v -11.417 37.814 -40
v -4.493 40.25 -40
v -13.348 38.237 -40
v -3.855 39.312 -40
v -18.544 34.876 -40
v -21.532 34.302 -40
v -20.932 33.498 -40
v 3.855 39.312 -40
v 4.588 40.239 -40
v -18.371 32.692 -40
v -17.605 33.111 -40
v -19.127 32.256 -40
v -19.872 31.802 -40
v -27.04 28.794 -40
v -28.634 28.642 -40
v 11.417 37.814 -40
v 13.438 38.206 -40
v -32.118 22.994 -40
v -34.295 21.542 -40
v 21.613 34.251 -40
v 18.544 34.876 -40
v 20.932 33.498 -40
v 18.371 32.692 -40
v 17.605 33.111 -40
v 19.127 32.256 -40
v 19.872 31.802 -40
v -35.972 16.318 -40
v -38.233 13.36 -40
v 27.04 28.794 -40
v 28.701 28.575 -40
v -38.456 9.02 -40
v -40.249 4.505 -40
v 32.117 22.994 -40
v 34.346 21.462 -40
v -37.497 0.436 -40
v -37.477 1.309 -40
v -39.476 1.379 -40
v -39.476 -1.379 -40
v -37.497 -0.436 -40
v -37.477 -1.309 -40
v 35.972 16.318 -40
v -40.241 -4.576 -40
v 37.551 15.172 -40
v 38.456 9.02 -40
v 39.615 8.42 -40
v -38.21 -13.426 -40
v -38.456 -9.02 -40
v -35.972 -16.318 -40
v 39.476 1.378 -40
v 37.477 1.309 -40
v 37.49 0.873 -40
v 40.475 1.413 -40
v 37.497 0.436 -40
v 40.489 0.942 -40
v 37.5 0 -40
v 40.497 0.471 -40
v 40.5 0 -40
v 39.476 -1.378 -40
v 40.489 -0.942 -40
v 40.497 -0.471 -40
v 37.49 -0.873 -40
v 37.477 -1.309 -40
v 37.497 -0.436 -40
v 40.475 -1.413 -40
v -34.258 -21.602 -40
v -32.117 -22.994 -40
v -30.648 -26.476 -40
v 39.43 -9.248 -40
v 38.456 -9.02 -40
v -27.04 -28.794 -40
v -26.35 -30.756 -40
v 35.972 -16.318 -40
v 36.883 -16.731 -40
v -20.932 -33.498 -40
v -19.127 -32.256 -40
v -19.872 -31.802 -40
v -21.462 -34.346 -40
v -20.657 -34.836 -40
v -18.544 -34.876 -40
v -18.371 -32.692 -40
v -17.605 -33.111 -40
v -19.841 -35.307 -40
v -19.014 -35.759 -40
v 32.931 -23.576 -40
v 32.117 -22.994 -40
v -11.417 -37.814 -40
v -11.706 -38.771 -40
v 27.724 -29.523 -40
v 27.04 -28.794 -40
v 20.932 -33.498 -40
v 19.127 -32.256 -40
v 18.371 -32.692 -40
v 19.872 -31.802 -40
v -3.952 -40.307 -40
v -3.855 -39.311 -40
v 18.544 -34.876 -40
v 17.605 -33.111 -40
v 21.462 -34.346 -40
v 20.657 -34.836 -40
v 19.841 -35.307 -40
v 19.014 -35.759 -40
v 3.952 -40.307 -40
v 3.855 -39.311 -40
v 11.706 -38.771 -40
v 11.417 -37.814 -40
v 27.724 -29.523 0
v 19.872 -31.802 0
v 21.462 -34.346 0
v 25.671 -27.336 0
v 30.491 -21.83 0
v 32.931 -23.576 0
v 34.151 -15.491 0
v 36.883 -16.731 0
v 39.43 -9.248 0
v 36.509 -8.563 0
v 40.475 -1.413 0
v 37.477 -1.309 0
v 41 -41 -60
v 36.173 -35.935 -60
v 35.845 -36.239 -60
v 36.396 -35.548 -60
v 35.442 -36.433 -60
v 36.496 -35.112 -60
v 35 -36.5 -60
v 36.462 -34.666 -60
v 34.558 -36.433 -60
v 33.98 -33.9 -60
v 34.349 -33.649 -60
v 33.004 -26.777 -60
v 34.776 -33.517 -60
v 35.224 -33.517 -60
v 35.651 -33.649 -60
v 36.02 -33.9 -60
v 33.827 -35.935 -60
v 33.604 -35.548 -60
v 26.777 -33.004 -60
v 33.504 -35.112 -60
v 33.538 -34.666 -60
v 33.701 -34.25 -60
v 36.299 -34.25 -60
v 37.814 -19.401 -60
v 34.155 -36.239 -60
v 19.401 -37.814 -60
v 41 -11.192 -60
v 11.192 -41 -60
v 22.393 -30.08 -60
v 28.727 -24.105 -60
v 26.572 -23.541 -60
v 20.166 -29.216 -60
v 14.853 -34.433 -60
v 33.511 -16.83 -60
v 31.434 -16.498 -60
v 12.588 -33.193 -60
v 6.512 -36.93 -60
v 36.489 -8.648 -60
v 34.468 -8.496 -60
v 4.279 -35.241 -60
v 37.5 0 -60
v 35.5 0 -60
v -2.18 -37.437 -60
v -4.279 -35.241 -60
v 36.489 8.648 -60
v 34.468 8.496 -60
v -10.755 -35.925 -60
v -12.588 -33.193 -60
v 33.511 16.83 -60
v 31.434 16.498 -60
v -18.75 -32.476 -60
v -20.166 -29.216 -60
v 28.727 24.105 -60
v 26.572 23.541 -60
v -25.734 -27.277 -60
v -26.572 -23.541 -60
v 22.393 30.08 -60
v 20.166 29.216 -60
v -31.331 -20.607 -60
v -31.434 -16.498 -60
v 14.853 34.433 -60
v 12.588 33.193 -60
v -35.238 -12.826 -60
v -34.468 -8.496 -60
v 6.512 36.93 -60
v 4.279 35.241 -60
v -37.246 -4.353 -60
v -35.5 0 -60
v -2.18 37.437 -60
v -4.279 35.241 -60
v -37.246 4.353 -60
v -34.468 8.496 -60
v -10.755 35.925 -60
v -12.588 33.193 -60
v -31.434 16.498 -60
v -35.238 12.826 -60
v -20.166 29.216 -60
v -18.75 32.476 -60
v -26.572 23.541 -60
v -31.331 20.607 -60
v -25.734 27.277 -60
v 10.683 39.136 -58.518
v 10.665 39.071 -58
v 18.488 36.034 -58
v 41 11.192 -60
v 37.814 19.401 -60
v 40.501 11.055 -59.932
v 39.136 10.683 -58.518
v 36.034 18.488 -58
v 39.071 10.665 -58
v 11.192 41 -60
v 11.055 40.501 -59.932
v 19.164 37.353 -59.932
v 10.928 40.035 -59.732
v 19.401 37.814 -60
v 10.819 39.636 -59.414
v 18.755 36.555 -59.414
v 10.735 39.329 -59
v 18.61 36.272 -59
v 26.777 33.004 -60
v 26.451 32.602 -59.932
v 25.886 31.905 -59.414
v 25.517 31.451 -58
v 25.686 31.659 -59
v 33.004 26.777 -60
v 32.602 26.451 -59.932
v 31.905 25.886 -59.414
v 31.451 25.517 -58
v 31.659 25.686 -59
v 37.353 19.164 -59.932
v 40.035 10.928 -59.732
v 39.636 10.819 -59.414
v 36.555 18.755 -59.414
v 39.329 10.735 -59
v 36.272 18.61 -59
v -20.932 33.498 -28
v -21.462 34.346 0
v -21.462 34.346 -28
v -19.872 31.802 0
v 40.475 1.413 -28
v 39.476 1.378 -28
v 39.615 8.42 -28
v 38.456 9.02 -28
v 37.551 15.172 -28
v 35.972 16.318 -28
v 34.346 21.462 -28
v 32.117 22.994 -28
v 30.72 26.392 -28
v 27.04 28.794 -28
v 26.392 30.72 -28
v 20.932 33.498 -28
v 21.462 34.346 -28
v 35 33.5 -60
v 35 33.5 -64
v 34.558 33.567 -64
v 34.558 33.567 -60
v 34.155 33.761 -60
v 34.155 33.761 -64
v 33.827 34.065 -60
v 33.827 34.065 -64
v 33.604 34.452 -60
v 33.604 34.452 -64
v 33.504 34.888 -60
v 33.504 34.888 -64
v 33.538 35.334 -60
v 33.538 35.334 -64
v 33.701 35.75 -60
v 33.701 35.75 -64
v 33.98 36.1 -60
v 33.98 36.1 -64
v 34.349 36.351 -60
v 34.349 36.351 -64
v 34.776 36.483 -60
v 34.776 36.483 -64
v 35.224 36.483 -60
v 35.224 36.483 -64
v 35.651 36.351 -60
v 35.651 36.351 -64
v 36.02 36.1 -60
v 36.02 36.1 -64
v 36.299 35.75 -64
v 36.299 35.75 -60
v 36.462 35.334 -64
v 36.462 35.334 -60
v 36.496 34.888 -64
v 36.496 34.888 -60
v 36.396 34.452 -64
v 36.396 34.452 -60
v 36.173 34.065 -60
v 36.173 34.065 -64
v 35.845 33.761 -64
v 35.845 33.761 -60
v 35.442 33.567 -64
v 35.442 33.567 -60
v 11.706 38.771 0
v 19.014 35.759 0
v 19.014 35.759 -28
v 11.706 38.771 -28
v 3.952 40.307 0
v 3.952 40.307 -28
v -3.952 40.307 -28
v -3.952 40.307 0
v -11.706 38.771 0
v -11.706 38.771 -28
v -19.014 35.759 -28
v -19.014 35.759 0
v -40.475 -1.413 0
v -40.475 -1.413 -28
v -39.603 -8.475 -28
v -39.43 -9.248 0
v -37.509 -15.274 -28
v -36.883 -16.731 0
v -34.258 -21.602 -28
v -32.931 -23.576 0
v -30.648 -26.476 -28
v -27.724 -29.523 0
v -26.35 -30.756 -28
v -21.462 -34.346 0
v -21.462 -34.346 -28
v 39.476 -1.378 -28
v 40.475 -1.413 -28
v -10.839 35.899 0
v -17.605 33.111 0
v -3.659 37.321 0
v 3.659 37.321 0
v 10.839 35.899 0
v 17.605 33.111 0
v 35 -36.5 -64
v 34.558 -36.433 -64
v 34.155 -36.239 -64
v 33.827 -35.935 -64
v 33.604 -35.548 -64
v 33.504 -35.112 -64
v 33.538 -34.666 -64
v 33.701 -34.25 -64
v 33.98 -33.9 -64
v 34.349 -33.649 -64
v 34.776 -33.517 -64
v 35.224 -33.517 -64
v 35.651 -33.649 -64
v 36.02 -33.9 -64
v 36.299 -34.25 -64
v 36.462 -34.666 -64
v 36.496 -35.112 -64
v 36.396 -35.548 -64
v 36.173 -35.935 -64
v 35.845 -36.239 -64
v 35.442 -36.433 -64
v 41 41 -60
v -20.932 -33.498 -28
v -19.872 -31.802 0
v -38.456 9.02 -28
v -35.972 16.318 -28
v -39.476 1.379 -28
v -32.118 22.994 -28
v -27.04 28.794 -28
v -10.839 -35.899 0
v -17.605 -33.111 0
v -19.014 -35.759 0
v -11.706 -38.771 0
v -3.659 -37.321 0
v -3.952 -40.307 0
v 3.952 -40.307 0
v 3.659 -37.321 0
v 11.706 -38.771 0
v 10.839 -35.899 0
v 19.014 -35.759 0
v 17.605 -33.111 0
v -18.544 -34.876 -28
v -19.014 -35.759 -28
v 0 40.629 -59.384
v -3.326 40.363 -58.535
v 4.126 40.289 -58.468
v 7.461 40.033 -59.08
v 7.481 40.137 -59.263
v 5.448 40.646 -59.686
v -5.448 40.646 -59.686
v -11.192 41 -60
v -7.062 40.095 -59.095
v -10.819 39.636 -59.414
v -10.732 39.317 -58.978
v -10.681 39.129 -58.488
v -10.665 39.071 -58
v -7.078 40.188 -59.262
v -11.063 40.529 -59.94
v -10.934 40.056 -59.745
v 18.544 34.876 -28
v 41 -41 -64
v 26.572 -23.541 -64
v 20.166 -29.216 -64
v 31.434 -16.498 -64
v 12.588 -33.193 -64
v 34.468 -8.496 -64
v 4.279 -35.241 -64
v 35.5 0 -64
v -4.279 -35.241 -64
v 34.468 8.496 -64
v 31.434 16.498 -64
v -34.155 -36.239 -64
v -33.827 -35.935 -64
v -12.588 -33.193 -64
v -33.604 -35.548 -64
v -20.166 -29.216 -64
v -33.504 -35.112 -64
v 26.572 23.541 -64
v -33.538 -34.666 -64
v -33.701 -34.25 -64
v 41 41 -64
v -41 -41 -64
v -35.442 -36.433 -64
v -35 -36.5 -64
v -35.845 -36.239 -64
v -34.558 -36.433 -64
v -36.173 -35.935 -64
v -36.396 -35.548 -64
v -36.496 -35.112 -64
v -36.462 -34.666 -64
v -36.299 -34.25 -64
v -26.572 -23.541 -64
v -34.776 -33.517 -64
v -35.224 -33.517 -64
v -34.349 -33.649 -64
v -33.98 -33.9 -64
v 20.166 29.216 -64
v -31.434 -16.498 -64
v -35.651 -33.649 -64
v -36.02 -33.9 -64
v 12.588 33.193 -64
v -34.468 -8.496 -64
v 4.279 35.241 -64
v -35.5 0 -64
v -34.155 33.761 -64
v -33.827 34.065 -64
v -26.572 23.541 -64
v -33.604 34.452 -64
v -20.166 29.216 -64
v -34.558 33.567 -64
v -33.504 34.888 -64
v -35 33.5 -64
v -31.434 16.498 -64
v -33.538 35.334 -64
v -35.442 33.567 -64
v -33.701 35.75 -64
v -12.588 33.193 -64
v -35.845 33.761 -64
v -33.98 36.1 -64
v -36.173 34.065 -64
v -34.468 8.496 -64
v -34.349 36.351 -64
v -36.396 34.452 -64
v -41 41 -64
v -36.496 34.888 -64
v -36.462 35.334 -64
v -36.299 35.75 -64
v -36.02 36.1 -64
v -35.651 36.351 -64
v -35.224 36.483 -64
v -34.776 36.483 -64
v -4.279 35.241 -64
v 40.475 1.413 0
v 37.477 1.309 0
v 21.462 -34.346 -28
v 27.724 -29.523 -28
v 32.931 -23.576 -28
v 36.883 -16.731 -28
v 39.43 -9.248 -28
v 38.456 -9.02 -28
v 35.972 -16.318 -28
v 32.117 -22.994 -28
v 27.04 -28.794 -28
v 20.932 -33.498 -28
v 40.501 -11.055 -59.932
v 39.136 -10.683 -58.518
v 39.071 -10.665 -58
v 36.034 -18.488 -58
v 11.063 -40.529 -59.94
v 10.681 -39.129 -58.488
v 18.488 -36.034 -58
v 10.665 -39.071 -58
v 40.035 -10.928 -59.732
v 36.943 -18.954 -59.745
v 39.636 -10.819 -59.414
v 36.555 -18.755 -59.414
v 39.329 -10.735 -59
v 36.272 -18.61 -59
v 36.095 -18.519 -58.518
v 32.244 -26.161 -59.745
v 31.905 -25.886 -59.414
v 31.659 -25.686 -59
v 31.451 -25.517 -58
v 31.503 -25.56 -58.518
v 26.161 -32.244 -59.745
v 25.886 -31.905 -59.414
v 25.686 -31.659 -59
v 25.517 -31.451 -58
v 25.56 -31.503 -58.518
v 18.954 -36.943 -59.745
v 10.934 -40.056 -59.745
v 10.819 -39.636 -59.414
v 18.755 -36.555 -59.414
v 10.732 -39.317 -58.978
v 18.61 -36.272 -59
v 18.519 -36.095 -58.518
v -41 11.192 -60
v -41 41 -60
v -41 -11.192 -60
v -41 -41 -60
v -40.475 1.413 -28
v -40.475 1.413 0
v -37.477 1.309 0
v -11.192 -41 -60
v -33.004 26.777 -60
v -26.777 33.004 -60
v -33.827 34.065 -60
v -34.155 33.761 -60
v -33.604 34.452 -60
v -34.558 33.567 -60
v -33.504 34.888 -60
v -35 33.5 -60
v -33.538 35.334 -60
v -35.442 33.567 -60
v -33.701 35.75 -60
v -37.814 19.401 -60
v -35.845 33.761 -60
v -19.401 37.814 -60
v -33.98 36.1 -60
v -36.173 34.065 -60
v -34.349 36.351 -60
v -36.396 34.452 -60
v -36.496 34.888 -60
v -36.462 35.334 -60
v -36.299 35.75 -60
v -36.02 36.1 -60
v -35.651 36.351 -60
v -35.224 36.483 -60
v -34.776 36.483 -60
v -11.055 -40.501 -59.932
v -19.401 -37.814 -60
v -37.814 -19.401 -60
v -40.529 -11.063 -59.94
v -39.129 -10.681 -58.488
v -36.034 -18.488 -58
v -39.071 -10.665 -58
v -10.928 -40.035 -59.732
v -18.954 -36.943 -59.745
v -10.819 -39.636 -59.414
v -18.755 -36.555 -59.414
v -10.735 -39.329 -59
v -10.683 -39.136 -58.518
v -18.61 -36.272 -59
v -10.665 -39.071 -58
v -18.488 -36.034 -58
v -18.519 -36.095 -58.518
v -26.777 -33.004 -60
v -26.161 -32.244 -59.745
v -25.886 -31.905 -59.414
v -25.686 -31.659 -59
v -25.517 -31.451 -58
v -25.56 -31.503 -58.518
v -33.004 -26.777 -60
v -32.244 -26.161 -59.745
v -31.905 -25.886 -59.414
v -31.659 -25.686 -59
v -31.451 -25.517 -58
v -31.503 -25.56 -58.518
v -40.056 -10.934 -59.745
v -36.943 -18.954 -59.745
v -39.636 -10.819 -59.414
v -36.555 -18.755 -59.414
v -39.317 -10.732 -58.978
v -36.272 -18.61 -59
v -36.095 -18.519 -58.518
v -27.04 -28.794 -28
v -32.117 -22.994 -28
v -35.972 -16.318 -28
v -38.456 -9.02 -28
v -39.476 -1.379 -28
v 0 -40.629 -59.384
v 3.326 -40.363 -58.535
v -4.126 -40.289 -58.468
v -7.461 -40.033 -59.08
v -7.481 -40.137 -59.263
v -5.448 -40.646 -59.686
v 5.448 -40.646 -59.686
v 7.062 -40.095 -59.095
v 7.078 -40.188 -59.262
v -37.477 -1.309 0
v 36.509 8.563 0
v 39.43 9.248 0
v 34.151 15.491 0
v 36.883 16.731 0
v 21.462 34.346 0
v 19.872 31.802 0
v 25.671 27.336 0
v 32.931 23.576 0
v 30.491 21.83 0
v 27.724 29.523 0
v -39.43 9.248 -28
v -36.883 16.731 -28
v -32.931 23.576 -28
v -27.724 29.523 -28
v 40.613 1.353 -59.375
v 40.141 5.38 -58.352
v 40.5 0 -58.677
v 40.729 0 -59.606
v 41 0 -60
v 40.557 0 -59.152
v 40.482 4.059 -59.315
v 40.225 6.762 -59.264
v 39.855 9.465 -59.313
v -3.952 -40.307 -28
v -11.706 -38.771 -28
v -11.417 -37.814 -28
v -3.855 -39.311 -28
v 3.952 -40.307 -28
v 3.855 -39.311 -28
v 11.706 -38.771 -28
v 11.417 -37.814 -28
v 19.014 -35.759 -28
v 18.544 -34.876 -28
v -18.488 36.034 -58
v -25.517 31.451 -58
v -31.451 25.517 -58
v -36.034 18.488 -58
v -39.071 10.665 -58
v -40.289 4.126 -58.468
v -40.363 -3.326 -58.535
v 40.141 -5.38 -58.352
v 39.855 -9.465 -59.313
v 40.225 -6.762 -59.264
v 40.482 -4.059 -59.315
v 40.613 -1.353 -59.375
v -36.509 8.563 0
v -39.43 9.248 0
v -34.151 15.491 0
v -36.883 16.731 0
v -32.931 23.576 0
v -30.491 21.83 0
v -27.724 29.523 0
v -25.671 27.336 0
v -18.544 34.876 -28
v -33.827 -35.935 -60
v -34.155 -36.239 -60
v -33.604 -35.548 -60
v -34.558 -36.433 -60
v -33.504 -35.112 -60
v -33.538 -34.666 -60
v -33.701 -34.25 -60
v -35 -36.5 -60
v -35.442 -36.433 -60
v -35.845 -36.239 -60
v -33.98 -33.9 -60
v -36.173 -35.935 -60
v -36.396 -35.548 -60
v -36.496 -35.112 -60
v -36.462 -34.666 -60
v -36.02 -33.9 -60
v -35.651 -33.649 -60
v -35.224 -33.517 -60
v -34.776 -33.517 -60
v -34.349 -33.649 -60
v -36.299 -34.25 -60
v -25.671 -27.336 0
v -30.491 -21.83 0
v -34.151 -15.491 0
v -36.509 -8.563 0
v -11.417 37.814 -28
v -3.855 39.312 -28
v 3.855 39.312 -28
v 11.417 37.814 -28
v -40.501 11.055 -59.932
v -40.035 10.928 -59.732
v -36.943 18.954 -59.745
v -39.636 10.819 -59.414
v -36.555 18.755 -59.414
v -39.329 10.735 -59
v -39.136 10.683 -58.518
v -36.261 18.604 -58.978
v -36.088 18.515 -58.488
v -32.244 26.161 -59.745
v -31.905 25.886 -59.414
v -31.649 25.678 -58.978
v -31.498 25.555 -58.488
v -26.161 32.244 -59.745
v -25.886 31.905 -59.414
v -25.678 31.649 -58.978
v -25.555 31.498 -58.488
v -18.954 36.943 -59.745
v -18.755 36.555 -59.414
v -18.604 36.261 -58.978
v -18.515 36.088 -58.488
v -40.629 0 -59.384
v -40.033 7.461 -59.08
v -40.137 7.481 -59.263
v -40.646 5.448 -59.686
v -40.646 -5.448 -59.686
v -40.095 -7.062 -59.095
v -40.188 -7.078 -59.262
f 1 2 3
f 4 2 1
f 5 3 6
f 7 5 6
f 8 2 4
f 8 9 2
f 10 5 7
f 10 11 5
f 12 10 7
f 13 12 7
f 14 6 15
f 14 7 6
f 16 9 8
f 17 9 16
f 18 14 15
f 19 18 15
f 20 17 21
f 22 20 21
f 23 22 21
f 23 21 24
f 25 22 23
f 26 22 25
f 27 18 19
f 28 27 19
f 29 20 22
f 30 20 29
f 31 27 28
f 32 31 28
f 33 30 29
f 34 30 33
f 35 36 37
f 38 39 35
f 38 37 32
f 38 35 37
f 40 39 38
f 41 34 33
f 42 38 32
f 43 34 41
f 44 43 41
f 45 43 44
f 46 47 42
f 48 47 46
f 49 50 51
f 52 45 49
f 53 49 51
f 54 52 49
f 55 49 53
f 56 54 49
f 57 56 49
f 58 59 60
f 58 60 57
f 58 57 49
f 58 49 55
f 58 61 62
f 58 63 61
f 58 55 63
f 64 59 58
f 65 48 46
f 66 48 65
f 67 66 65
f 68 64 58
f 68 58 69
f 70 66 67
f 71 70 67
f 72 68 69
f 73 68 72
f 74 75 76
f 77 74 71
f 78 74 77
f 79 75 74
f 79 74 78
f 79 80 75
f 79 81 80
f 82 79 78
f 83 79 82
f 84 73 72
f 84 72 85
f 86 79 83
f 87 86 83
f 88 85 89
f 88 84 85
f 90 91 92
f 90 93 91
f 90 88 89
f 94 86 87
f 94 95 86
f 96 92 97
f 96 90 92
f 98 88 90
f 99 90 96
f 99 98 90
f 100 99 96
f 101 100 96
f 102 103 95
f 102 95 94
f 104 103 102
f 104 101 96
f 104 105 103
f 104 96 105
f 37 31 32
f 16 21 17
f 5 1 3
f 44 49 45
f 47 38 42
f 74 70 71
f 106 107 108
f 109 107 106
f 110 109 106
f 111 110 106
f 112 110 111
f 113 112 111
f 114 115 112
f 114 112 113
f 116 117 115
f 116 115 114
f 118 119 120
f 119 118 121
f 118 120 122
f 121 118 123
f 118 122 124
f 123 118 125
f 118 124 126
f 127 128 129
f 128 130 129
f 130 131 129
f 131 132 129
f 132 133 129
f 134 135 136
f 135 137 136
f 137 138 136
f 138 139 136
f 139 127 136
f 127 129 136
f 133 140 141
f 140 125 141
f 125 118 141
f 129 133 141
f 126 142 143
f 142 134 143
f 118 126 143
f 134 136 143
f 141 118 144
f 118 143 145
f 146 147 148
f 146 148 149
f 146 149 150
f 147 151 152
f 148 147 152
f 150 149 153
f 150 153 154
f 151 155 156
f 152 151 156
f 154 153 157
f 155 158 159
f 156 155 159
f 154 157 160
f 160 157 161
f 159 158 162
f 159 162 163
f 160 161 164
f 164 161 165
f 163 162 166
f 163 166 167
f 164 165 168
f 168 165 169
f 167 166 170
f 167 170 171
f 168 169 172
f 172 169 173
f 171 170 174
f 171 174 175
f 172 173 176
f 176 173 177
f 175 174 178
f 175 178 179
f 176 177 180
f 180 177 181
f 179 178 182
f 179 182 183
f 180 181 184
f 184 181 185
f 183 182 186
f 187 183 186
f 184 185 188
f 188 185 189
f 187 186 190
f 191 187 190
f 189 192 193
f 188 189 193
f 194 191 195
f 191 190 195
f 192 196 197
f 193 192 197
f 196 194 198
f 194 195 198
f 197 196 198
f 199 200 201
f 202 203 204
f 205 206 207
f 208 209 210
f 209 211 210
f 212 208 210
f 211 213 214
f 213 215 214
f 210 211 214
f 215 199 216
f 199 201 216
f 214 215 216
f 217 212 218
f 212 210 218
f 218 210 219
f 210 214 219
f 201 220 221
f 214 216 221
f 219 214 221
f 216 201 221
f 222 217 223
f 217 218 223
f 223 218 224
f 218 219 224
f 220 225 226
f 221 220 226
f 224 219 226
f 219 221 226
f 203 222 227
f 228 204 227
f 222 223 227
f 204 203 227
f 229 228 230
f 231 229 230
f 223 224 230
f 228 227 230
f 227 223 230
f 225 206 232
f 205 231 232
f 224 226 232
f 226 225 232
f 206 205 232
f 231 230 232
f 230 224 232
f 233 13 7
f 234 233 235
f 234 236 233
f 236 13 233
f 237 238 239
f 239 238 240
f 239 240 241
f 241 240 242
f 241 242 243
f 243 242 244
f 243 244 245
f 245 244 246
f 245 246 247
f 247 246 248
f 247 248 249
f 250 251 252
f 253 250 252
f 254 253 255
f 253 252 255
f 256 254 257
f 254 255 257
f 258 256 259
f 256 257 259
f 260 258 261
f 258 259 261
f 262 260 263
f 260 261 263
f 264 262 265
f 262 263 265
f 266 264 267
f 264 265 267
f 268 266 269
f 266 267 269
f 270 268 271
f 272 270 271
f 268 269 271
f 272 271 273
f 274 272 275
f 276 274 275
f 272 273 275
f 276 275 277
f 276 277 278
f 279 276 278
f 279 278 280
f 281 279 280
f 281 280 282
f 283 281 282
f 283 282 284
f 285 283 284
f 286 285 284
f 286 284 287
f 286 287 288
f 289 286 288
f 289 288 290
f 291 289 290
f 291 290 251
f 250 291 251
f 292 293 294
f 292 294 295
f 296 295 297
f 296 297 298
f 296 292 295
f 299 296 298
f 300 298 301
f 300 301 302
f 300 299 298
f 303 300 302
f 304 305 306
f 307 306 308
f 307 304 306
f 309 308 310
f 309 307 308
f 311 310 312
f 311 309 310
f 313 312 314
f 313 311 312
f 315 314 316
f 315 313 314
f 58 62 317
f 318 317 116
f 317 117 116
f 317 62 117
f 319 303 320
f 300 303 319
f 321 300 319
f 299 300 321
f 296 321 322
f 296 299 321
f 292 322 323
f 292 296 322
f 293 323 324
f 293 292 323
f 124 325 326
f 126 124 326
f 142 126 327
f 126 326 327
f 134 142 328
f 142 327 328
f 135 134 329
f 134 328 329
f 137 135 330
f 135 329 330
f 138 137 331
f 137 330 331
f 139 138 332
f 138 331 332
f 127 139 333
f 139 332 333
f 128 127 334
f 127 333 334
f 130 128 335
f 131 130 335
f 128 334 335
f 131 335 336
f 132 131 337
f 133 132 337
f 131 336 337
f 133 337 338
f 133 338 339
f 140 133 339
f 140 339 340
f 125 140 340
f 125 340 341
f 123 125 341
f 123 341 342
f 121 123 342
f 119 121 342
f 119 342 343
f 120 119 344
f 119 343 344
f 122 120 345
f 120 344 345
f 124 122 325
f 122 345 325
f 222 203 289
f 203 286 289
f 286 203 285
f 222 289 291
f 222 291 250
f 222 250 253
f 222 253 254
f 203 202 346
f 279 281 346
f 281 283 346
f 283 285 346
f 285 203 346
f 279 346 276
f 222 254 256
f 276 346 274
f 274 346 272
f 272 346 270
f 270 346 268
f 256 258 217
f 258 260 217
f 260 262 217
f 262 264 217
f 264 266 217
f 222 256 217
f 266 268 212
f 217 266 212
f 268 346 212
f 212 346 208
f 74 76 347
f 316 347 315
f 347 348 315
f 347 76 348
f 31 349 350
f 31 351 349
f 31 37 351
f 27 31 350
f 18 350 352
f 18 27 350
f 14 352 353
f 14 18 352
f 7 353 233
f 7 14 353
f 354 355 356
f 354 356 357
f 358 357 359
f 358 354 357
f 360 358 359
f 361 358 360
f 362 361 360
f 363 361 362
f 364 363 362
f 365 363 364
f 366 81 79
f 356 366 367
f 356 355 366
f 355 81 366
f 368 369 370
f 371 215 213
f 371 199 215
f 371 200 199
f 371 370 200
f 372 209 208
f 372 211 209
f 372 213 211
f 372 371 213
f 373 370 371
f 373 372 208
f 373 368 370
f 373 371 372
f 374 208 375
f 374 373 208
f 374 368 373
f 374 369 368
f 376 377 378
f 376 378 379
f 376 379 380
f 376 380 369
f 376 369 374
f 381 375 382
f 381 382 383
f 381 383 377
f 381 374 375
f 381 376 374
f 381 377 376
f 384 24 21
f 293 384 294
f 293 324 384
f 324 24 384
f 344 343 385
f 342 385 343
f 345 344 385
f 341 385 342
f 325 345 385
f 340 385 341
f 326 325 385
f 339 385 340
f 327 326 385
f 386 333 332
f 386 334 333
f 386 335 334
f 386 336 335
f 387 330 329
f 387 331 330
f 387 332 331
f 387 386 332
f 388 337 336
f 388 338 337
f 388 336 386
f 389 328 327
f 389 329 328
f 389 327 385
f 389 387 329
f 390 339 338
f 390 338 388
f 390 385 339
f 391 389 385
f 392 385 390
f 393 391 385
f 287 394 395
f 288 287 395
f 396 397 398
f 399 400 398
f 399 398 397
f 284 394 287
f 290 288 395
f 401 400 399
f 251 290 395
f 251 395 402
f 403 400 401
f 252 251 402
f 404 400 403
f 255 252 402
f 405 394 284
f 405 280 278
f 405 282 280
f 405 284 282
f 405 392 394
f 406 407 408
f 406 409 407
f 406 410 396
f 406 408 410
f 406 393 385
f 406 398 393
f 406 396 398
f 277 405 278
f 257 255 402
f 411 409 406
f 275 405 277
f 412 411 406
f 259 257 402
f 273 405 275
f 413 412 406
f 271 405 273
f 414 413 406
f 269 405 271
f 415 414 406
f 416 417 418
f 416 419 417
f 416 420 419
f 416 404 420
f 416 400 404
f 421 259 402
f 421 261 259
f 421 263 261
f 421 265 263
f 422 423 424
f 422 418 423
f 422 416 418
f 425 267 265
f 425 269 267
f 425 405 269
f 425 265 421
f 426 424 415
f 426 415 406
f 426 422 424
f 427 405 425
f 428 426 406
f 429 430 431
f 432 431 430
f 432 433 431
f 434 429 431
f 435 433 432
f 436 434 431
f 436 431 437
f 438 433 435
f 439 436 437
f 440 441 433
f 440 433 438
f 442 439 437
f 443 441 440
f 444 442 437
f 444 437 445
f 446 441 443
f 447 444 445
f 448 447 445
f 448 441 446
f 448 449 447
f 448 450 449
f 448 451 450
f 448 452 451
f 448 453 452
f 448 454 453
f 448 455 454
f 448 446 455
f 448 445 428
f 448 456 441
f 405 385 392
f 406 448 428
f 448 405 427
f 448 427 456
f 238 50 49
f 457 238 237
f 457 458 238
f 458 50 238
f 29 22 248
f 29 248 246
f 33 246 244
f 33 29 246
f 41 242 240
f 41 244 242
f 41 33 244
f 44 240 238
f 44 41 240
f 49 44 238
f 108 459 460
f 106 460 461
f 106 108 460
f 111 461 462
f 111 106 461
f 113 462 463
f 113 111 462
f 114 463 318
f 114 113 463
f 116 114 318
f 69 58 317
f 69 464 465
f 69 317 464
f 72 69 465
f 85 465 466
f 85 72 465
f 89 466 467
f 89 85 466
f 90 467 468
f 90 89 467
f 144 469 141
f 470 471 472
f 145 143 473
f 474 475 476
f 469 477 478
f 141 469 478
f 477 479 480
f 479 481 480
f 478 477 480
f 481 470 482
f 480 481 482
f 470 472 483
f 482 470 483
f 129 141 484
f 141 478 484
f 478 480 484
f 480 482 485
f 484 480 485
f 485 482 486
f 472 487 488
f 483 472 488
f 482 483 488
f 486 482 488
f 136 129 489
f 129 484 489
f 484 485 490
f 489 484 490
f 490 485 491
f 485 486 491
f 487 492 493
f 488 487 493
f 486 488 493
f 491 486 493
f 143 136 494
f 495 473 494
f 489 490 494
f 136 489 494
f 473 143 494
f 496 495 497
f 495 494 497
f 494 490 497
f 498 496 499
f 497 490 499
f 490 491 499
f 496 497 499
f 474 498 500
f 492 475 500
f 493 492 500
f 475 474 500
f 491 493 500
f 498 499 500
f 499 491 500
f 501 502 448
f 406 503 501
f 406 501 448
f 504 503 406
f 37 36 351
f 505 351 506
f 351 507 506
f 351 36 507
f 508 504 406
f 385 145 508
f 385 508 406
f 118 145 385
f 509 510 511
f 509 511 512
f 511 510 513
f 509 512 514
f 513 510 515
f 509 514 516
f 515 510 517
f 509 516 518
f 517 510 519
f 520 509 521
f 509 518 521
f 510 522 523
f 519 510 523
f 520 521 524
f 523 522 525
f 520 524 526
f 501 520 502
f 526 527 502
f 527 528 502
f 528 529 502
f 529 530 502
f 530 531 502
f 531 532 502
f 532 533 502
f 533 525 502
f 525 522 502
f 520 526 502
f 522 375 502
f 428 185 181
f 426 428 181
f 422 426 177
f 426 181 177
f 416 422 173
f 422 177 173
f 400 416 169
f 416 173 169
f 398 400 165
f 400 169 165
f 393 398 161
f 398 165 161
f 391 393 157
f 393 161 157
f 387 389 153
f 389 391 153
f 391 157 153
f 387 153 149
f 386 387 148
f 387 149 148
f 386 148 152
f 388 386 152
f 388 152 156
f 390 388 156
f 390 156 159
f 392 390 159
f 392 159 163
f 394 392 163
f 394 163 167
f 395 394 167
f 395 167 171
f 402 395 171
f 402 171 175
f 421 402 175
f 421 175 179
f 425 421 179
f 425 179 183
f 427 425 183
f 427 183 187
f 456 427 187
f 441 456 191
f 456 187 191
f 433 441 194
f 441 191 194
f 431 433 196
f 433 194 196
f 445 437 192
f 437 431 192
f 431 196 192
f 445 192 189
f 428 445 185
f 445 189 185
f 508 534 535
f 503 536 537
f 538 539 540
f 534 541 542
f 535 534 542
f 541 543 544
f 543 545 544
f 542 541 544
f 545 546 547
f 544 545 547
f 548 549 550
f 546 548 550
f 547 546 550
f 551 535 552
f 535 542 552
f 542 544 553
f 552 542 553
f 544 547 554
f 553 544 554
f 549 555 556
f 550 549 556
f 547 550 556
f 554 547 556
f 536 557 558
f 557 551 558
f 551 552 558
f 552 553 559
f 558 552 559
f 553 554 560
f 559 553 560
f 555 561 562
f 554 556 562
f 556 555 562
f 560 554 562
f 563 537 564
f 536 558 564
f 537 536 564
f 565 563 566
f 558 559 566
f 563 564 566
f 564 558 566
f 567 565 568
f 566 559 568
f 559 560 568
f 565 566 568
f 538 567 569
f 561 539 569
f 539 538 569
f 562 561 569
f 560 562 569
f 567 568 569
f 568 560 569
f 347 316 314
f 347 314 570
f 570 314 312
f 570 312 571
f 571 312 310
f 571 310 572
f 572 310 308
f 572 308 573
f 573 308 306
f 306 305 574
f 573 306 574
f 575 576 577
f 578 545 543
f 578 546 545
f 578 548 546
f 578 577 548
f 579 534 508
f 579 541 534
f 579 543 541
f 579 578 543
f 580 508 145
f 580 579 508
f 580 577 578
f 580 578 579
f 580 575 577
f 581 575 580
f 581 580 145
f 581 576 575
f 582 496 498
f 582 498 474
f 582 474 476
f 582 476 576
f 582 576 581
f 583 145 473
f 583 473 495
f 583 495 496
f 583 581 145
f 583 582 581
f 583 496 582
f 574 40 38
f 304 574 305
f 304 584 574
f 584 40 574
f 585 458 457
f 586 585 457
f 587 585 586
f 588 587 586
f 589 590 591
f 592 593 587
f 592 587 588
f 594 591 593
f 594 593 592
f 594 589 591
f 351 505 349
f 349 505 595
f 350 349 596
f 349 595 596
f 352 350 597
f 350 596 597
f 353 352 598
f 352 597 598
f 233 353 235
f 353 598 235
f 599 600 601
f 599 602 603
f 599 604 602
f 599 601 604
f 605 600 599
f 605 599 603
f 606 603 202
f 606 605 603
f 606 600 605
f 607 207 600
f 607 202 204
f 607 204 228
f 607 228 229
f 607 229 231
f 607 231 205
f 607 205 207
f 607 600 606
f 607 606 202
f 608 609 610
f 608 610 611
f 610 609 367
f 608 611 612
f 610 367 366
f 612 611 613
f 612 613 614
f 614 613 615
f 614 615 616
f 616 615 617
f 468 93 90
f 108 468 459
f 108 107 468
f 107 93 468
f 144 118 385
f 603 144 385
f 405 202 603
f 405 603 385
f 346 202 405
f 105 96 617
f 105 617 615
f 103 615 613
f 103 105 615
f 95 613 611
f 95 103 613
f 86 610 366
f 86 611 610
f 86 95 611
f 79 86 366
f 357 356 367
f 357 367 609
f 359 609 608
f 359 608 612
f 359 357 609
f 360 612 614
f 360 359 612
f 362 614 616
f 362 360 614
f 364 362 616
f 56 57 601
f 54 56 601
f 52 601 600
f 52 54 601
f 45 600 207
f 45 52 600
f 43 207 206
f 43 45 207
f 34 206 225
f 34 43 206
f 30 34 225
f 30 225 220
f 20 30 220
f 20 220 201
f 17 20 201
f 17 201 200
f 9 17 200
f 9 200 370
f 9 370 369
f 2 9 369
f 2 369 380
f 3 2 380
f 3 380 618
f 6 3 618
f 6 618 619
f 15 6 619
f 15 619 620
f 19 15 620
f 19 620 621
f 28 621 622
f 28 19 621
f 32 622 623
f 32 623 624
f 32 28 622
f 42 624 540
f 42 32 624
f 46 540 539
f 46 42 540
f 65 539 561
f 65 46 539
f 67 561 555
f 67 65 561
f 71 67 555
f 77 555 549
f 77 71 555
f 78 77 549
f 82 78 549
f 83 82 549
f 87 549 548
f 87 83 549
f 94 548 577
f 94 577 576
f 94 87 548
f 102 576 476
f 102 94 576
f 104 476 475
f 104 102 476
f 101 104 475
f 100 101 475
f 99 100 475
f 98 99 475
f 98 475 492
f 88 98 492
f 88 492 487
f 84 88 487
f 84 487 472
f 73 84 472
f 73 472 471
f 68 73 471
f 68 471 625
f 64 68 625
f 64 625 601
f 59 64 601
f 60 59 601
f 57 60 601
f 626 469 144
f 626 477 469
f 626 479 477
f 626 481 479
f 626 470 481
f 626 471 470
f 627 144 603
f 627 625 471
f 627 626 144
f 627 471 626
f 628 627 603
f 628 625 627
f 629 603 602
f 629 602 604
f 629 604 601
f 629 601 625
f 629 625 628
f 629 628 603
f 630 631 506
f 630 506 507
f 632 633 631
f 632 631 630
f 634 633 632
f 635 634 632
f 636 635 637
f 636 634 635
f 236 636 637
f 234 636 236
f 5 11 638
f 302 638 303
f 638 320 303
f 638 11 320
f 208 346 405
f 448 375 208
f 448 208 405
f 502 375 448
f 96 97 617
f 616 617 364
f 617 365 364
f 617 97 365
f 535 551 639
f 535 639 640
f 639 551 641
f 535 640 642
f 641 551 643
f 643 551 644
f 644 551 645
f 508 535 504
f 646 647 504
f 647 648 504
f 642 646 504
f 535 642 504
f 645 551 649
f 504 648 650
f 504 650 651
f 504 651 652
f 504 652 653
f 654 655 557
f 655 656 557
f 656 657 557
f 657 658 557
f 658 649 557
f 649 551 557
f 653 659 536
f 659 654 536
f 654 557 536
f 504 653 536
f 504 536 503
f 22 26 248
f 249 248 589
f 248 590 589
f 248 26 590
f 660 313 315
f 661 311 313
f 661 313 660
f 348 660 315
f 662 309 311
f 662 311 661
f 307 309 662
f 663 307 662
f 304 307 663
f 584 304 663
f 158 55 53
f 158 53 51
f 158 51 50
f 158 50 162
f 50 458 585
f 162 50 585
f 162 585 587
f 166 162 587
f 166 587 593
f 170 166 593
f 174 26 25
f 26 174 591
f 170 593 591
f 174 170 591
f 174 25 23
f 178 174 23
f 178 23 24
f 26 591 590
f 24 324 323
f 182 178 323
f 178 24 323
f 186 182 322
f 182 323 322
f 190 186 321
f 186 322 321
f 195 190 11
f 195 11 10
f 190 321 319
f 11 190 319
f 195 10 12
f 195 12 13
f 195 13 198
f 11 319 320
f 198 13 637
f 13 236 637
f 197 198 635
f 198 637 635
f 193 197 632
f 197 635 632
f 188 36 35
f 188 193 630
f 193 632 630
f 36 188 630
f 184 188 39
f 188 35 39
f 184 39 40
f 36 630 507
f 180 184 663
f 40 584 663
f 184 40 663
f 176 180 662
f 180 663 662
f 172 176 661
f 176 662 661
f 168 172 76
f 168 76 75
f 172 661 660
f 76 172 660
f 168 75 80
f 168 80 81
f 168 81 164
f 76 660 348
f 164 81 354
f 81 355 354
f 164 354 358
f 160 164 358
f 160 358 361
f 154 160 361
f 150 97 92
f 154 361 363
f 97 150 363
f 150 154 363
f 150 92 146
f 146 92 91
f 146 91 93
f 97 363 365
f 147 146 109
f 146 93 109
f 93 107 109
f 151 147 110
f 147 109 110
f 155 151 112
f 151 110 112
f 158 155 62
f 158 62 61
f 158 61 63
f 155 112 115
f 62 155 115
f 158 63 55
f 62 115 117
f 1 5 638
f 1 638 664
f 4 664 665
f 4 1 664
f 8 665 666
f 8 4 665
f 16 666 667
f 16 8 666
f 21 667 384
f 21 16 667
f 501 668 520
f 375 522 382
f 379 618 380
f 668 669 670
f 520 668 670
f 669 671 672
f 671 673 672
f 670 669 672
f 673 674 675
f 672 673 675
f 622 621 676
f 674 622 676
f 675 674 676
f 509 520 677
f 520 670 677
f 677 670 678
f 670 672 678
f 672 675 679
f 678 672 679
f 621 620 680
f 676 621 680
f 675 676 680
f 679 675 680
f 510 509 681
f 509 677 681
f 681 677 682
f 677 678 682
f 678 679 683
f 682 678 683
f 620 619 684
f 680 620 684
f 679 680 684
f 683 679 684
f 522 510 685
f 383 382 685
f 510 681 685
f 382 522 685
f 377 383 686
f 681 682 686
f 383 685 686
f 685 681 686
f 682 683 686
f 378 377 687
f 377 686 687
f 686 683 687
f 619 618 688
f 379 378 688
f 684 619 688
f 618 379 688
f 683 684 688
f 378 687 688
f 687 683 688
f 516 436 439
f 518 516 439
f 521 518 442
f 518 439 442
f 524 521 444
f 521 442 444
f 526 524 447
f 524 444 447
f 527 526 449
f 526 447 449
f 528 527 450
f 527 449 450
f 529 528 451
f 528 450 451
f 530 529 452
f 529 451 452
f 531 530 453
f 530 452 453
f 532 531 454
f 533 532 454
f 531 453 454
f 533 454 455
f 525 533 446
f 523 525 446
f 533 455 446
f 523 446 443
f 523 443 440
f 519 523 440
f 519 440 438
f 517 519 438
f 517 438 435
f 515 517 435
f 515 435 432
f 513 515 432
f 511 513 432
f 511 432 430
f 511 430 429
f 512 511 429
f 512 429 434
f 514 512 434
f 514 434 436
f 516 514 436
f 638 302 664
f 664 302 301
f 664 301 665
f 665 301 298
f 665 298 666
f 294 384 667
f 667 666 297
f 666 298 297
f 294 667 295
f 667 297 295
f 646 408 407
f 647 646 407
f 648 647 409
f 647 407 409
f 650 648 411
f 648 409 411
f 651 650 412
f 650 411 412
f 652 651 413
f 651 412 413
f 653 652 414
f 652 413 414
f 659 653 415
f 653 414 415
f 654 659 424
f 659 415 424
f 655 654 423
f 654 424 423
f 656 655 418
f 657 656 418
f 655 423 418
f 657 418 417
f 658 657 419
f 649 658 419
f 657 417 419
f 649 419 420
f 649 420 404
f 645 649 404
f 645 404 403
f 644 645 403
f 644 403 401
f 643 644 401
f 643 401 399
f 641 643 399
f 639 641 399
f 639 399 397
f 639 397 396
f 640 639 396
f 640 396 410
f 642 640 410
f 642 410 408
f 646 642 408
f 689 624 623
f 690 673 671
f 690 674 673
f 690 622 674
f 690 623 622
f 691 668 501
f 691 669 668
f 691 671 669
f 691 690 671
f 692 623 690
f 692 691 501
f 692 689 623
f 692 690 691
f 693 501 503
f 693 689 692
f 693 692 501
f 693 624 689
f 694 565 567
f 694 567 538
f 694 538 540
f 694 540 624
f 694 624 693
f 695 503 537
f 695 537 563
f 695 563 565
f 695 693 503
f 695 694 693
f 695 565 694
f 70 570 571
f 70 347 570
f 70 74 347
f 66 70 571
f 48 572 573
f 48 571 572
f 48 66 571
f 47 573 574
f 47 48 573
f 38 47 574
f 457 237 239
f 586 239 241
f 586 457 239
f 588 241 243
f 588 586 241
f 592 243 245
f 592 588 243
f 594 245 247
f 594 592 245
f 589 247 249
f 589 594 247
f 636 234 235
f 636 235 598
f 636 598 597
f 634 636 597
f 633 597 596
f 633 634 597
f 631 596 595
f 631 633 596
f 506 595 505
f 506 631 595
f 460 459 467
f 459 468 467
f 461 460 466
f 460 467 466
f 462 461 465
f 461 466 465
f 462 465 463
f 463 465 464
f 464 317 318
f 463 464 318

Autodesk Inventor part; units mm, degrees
ref_plane "YZ Plane" through (0, 0, 0) normal (1, 0, 0) x (0, 1, 0)
ref_plane "XZ Plane" through (0, 0, 0) normal (0, 1, 0) x (-1, 0, 0)
ref_plane "XY Plane" through (0, 0, 0) normal (0, 0, 1) x (1, 0, 0)
sketch "Sketch1" plane through (0, 0, 0) normal (0, 0, 1) x (1, 0, 0)
  circle A0 centre (0, 0) radius 37.5 projected
  circle A1 centre (0, 0) radius 40.5
  point P0 (0, 0)
  dimension "d0" = 3
extrude "Extrusion1" add sketch "Sketch1" against normal blind 60
sketch "Sketch8" plane through (0, 0, 0) normal (0, 0, 1) x (1, 0, 0)
  line L0 (0, 0) -> (-46.6973, 0) construction
  line L1 (0, 0) -> (-40.4753, 1.4134) construction
  circle A0 centre (0, 0) radius 40.5 projected
  line L2 (0, 0) -> (-40.4753, -1.4134) construction
  circle A1 centre (0, 0) radius 37.5 projected
  line L3 (-37.4772, -1.3087) -> (-40.4753, -1.4134)
  line L4 (-37.4772, 1.3087) -> (-40.4753, 1.4134)
  dimension "d30" = 4
extrude "Extrusion9" cut sketch "Sketch8" against normal blind 40 contours L4 A1 L3 A0 picked at (-39.4973, -0.1454)
pattern_circular "Circular Pattern2" count 6 over 360 about axis through (0, 0, 0) along (0, 0, -1) of "Extrusion9"
sketch "Sketch9" plane through (21.4617, -34.3459, -40) normal (0, 0, 1) x (0.848, 0.5299, 0)
  circle A0 centre (0, 40.5) radius 37.5 construction
  circle A1 centre (0, 40.5) radius 40.5 projected
  circle A2 centre (0, 40.5) radius 39.5
  point P0 (0, 40.5)
  dimension "d36" = 1
extrude "Extrusion10" cut sketch "Sketch9" along normal blind 12
sketch "Sketch10" plane through (0, 0, -60) normal (0, 0, -1) x (-1, 0, 0)
  line L0 (41, -41) -> (-41, -41)
  line L1 (-41, -41) -> (-41, 41)
  line L2 (-41, 41) -> (41, 41)
  line L3 (41, 41) -> (41, -41)
  line L4 (41, -41) -> (-41, 41) construction
  line L5 (-41, -41) -> (41, 41) construction
  circle A0 centre (0, 0) radius 37.5 construction
  circle A1 centre (0, 0) radius 35.5
  point P0 (0, 0)
  dimension "d39" = 82
  dimension "d40" = 82
  dimension "d41" = 2
extrude "Extrusion11" add sketch "Sketch10" along normal blind 4
sketch "Sketch11" plane through (0, 0, -60) normal (0, 0, 1) x (1, 0, 0)
  line L0 (-41, 41) -> (-41, -41) construction
  line L1 (-41, -41) -> (41, -41) construction
  line L2 (41, -41) -> (41, 41) construction
  line L3 (41, 41) -> (-41, 41) construction
  line L4 (-35, -35) -> (-35, 35) construction
  line L5 (-35, 35) -> (35, 35) construction
  line L6 (35, 35) -> (35, -35) construction
  line L7 (35, -35) -> (-35, -35) construction
  point P0 (0, 0)
  dimension "d44" = 6
hole "Hole1" at (-35, -35, -60) at (-35, 35, -60) at (35, 35, -60) at (35, -35, -60) direction (0, 0, -1) diameter 3 end through all
fillet "Fillet2" radius 2 1 edges at (-40.5, 0, -60)
sketch "Sketch7" plane through (0, 0, -5) normal (0, 0, -1) x (-1, 0, 0)
  circle A0 centre (0, 0) radius 40.5 projected
  circle A1 centre (0, 0) radius 39.5
  point P0 (0, 0)
  dimension "d27" = 1
properties part number "Cup_Dispenser_Flip_Flop"
